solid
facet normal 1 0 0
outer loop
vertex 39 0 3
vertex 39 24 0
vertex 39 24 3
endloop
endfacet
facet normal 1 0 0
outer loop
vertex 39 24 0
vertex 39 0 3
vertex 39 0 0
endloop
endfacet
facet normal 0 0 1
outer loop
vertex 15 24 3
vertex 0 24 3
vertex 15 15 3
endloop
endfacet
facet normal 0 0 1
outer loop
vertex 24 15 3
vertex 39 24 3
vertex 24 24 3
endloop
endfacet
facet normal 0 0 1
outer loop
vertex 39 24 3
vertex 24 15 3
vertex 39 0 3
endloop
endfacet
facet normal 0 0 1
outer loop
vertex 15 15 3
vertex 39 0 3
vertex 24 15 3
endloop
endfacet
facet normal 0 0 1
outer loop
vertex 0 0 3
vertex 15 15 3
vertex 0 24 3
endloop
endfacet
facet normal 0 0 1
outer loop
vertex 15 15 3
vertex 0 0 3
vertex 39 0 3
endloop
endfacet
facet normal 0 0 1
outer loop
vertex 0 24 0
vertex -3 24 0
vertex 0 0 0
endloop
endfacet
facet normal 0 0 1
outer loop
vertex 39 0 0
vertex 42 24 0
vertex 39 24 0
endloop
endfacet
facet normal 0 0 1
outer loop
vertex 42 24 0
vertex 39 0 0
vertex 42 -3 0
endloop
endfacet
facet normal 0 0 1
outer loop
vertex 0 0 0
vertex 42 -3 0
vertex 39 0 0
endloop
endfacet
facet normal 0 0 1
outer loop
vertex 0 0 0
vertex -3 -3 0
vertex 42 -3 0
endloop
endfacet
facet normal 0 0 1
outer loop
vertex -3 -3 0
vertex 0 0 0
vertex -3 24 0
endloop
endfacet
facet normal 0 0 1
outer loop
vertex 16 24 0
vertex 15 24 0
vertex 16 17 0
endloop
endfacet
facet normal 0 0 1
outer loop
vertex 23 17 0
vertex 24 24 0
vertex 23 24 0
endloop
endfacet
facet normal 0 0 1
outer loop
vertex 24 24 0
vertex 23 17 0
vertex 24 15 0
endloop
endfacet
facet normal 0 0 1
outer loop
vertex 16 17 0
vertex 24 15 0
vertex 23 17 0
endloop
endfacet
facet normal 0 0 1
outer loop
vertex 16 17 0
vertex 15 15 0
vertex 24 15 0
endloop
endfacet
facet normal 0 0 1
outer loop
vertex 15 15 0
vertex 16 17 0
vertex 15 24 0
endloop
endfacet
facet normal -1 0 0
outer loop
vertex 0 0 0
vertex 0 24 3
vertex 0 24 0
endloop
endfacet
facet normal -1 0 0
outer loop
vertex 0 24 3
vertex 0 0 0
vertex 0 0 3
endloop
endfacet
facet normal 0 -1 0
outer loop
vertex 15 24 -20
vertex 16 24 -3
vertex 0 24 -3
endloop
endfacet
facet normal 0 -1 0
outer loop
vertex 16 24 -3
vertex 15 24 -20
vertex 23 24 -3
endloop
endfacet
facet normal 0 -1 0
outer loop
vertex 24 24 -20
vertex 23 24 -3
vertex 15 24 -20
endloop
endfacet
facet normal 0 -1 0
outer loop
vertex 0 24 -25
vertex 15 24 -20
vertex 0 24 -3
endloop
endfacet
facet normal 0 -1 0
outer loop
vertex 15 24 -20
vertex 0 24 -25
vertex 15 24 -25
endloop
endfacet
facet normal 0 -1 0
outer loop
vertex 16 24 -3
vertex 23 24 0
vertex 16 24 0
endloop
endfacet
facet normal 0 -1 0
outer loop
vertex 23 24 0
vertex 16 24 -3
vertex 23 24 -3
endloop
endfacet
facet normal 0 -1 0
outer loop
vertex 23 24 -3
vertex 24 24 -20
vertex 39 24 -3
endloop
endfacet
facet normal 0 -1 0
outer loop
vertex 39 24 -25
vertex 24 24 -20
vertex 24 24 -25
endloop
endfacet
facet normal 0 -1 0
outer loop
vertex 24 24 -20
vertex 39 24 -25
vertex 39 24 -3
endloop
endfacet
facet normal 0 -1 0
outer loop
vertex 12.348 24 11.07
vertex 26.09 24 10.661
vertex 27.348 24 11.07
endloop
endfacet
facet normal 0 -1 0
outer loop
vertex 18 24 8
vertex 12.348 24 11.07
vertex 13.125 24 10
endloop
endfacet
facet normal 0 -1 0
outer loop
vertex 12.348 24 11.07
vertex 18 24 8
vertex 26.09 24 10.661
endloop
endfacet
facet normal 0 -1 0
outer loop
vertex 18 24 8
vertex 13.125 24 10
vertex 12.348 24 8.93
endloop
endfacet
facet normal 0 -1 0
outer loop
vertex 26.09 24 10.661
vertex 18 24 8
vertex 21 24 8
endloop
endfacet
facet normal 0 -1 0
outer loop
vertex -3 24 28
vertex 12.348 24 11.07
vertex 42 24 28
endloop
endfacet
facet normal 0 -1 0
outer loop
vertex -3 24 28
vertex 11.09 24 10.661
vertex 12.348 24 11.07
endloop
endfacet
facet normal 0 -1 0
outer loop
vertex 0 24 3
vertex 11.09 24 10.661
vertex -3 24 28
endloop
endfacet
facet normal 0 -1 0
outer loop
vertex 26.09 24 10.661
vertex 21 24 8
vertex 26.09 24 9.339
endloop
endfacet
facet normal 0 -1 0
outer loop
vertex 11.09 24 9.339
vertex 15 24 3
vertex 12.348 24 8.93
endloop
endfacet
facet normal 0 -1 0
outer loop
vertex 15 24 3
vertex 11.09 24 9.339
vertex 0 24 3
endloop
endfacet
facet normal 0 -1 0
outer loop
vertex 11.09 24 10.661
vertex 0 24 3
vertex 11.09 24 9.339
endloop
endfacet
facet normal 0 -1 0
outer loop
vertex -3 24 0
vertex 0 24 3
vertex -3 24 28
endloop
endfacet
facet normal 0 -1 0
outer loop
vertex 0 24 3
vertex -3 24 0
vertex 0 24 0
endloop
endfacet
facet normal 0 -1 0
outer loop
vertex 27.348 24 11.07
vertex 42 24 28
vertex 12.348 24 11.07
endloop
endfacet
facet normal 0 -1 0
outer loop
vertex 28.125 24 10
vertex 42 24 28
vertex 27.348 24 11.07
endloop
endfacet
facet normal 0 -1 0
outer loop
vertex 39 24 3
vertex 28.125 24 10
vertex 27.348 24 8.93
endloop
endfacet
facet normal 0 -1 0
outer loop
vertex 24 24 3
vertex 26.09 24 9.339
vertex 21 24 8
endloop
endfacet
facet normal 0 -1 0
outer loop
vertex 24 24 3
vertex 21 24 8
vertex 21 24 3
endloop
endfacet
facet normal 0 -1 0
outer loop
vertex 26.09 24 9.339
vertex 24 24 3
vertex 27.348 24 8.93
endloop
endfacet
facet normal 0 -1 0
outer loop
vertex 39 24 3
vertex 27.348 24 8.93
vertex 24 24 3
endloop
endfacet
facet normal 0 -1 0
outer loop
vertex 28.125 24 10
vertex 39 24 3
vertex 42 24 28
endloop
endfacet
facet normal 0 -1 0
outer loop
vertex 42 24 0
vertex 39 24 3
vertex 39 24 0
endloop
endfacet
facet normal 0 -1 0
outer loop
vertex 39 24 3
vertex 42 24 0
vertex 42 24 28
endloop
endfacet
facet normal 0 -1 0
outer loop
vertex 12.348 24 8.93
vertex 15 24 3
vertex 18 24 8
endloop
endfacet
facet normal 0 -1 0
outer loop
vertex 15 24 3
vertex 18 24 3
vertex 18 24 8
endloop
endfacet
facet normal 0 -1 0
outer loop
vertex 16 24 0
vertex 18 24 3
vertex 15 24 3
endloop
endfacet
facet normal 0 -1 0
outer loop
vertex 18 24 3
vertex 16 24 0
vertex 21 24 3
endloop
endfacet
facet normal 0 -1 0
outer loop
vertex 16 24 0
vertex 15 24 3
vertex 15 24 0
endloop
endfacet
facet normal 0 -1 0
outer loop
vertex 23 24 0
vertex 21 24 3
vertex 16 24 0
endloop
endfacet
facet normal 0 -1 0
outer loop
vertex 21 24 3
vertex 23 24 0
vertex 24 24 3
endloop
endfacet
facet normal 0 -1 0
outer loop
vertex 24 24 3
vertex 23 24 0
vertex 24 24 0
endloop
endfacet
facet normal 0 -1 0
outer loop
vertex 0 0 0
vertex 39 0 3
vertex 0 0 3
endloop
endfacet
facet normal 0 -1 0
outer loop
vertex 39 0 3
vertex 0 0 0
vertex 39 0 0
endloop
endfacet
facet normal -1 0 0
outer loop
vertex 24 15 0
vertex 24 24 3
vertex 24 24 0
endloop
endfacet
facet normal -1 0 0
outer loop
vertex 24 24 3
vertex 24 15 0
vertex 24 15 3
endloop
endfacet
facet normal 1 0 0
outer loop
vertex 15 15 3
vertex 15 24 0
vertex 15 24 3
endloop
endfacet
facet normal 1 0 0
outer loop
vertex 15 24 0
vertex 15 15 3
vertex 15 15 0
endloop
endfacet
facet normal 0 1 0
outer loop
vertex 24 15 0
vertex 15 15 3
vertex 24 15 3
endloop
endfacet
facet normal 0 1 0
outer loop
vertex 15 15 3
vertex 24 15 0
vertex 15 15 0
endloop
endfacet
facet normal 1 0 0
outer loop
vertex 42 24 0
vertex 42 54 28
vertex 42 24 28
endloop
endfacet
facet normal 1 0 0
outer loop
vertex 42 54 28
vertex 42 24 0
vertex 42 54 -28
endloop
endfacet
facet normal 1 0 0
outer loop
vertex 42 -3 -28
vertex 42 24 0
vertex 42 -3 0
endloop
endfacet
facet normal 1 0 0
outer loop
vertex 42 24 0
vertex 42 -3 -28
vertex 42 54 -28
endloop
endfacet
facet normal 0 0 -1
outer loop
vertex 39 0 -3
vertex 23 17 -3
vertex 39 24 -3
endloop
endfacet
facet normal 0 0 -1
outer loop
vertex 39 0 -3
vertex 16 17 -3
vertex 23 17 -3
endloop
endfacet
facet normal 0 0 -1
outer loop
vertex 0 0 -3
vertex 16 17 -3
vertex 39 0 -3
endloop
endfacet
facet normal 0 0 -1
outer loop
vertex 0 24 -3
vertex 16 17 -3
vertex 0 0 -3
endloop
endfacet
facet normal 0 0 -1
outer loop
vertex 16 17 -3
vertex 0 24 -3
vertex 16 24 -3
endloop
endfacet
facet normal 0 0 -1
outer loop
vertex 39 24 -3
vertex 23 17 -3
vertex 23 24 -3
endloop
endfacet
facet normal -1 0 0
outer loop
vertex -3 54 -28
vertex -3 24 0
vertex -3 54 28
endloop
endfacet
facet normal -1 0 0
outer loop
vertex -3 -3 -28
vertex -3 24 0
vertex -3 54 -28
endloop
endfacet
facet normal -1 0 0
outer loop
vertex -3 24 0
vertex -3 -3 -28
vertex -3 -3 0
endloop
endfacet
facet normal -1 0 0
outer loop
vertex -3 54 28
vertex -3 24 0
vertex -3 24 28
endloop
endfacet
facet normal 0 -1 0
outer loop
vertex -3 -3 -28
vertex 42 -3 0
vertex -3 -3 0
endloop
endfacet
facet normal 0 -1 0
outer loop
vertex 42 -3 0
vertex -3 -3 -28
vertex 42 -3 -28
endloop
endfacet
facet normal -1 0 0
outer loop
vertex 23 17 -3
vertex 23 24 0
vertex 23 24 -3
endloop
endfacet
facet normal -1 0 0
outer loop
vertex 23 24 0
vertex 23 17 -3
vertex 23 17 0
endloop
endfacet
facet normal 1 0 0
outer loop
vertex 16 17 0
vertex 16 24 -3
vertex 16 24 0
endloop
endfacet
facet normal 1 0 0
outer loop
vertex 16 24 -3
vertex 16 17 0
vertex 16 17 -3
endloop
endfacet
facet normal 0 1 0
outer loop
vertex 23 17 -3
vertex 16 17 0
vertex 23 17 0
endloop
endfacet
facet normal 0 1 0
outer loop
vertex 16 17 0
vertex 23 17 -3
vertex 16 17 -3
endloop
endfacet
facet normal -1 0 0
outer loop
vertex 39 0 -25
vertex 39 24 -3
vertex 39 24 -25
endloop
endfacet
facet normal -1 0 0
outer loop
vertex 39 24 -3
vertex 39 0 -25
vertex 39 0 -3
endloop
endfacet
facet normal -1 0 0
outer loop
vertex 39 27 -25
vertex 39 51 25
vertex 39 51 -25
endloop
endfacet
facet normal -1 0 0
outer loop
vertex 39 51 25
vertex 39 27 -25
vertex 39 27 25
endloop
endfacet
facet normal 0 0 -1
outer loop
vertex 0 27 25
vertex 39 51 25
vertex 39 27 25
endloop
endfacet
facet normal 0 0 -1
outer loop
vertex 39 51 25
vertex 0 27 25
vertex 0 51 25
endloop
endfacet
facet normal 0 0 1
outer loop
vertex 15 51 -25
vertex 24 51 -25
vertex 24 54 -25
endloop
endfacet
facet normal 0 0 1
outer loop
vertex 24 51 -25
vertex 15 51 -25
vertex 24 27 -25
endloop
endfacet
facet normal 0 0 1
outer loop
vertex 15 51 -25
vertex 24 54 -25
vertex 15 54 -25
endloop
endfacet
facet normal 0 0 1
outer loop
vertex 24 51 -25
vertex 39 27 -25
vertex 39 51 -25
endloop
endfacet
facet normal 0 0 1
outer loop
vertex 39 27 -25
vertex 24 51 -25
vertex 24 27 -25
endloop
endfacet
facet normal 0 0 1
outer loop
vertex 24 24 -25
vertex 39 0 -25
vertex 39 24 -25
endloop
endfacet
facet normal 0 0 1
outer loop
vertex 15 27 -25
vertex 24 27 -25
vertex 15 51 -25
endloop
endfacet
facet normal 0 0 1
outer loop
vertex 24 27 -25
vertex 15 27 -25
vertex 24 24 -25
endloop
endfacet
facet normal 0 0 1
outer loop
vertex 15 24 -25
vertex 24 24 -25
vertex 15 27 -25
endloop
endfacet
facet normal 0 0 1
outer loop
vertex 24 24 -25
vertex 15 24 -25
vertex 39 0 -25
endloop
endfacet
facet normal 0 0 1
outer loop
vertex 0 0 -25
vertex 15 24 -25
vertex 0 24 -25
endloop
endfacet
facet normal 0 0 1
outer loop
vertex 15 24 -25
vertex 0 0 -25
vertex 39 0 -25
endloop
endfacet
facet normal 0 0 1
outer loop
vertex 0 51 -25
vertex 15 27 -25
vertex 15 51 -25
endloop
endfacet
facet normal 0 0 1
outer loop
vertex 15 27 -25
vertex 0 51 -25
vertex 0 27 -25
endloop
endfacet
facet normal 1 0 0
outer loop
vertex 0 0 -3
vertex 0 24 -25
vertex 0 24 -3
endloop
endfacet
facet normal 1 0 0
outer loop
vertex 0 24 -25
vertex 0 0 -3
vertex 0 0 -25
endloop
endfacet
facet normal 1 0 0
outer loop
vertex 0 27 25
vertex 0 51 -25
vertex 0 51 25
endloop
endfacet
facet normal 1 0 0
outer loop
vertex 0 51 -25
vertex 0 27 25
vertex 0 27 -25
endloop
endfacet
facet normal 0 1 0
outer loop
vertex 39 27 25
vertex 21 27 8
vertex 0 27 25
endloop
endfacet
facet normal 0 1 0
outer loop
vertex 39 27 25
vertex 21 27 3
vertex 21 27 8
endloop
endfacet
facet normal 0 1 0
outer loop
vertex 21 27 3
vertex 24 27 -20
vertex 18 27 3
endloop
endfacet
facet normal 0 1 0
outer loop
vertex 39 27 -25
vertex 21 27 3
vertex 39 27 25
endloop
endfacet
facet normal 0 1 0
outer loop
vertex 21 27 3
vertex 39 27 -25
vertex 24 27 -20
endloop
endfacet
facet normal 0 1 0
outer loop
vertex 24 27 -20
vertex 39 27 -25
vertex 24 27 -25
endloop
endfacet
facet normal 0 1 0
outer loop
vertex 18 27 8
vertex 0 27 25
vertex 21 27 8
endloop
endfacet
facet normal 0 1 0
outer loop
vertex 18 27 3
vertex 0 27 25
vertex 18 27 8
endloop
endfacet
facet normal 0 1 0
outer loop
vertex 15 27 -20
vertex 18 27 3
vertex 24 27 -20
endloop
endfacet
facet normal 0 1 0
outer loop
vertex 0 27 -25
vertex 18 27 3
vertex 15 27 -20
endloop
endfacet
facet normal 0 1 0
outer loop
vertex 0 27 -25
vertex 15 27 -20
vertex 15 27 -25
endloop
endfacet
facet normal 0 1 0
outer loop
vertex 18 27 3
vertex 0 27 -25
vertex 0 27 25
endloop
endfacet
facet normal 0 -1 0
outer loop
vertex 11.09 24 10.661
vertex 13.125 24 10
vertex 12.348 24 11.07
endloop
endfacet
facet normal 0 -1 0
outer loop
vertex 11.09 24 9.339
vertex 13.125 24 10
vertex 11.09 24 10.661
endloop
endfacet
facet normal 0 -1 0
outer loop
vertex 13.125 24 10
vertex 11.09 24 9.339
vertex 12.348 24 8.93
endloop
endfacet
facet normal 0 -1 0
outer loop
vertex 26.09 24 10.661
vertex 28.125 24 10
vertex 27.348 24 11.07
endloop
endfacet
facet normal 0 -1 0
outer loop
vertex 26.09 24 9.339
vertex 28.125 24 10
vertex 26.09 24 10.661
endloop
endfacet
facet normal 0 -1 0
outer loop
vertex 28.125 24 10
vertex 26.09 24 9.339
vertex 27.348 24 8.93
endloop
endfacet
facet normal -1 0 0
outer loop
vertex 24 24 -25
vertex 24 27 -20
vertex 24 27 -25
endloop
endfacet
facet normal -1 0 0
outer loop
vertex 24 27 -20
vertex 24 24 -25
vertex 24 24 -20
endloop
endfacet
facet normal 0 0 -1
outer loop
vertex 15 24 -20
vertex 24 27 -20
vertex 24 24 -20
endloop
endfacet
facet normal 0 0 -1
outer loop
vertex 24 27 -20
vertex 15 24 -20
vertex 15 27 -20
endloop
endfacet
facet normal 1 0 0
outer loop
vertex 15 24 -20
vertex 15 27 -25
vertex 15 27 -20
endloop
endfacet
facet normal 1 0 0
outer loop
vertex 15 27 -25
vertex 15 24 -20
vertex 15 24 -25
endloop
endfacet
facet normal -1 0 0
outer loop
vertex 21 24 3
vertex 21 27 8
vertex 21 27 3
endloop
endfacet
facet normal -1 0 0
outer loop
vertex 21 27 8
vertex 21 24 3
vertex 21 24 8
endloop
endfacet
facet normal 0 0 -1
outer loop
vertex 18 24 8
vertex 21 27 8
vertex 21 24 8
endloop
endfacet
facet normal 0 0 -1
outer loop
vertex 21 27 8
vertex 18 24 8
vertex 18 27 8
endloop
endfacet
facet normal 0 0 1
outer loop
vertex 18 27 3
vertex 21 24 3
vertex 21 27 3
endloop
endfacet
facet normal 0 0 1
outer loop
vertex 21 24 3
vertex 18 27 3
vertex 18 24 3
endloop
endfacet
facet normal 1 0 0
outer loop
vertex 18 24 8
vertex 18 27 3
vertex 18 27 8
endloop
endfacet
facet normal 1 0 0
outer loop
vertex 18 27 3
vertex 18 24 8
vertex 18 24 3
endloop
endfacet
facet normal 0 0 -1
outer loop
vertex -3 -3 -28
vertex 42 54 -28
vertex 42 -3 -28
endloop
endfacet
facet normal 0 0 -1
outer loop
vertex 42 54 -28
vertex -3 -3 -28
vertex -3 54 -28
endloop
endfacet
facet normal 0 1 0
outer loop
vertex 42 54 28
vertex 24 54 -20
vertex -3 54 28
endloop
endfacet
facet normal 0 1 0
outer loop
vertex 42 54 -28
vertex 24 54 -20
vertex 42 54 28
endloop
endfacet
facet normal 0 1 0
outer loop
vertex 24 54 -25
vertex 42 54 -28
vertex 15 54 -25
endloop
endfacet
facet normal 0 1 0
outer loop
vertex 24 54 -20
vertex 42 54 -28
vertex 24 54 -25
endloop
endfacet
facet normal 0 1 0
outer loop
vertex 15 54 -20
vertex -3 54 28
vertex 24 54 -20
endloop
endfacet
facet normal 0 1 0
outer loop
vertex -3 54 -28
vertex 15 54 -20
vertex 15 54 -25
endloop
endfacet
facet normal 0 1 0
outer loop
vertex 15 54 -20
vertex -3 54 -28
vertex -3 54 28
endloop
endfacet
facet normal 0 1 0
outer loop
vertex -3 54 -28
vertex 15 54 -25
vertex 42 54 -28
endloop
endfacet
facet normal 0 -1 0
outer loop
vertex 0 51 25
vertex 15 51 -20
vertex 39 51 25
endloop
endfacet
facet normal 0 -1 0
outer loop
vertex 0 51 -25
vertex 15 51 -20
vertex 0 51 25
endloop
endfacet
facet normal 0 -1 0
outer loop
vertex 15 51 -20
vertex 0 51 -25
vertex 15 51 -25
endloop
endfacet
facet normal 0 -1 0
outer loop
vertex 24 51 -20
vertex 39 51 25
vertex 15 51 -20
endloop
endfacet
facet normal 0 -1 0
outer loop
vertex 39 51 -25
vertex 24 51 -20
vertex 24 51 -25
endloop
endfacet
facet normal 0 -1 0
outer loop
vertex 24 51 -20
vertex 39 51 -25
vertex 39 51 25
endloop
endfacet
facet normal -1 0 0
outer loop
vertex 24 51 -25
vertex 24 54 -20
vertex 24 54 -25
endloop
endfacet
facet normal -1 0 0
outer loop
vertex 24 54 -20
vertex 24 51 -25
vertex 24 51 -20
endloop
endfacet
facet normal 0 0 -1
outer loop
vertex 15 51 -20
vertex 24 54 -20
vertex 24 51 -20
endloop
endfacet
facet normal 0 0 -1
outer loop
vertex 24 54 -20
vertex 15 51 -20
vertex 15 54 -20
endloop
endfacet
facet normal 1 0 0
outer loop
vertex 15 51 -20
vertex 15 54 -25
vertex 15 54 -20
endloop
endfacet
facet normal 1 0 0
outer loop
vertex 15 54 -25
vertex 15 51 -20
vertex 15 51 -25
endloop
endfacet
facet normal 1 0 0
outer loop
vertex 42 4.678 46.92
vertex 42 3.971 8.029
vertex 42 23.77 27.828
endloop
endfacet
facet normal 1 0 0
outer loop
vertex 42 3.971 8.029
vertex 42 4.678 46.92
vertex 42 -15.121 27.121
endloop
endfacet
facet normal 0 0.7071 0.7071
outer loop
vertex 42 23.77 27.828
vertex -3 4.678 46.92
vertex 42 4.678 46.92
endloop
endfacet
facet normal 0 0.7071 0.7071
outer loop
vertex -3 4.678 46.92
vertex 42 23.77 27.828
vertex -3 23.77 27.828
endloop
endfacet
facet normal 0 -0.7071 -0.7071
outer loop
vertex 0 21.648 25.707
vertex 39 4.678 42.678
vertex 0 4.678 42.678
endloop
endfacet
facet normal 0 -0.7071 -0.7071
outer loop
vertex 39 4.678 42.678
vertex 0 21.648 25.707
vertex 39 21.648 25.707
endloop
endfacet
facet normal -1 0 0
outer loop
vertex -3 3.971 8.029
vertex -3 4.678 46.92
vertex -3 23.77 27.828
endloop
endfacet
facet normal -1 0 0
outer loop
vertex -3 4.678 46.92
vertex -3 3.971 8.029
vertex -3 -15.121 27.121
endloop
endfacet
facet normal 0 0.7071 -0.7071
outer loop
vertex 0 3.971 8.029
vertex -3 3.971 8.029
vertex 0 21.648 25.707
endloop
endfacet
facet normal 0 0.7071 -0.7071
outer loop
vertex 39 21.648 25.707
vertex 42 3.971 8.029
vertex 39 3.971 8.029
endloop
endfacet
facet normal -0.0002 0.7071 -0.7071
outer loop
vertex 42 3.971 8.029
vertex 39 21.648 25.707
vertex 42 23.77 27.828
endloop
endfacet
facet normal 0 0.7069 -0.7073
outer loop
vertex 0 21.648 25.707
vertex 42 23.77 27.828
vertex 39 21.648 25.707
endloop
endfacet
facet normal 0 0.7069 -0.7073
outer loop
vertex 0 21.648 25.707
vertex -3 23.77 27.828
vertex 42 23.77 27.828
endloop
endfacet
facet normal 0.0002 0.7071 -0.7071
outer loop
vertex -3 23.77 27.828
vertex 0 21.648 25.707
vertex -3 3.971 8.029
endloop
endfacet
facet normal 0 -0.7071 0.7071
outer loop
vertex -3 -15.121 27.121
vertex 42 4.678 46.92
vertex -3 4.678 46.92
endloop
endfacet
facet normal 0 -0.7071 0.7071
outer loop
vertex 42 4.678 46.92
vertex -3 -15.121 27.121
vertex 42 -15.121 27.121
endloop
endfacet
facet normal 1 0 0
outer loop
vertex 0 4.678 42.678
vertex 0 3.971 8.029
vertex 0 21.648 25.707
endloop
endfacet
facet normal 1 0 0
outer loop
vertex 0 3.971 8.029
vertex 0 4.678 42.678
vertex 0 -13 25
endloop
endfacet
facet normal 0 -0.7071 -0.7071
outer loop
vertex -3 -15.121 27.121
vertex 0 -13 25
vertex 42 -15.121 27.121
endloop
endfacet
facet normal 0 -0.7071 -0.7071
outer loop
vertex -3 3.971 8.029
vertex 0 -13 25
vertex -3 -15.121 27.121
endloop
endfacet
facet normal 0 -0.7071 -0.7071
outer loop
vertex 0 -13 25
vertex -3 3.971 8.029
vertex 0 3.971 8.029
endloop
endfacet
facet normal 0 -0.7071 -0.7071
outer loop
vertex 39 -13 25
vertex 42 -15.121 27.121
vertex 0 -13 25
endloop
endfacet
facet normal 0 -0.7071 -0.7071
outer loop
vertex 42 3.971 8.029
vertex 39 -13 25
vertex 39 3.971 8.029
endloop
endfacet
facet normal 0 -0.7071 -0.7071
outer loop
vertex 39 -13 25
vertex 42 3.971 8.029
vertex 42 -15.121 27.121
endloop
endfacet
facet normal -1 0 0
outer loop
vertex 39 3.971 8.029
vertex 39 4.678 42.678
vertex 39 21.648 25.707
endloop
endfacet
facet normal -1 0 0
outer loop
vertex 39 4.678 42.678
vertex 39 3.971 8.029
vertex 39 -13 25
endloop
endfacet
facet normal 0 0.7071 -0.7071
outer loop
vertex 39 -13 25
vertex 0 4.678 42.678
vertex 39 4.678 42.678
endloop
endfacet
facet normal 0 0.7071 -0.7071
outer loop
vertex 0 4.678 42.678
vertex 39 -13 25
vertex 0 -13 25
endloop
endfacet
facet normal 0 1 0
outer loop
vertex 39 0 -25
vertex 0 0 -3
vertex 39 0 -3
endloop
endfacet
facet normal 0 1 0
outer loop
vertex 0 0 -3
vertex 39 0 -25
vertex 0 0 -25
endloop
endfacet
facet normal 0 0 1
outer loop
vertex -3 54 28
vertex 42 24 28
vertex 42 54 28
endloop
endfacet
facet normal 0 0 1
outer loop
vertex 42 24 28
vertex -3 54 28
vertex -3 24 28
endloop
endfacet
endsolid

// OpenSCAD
mthick = 3;

difference() {
color([0,0,1,0.5]) cube([39, 24, 3]);
translate([15,24-9,0]) cube([9,9,3]);
};

translate([-3,-3,-3]) difference() {
color([0,0,1,0.5]) cube([39+2*3, 24+3, 3]);
translate([19,27-7,0]) cube([7,7,3]);
};

// middle

translate([0,24,-25]) difference() {
color([0,0,1,0.5]) cube([39,3,50]);
translate([15,0,0]) cube([9,3,5]);
    // not to scale
rotate([90,0,0]) translate([12,35,0]) cylinder(3, 2.25/2, 2.25/2, 0);
    // not to scale
rotate([90,0,0]) translate([27,35,0]) cylinder(3, 2.25/2, 2.25/2, 0);
    // not to scale
    translate([18,0,28]) cube([3,3,5]);
}

// side 1

translate([-3,-3,-28]) union() {
color([0,0,1,0.5]) cube([3,24+3,25]);
translate([0,24+3,0]) color([0,0,1,0.5]) cube([3,30,53]);
};

// side 2

translate([39,-3,-28]) union() {
color([0,0,1,0.5]) cube([3,24+3,25]);
translate([0,24+3,0]) color([0,0,1,0.5]) cube([3,30,53]);
};

// bottom
translate([0,-3,-28]) color([0,0,1,0.5]) cube([39,57,3]);

// front panel
translate([0,-3,-25]) color([0,0,1,0.5]) cube([39,3,22]);

// top panel
translate([-3,24,25]) color([0,0,1,0.5]) cube([45,30,3]);

// back panel

translate([0,51,-25])
difference() {
     color([0,0,1,0.5]) cube([39,3,50]);
     translate([15,0,0]) cube([9,3,5]);
}

// lid
translate([0,-13,25]) rotate([-45,0,0]) {
// top
color([0,0,1,0.5]) translate([-3,-3,25]) cube([45,27,3]);

// sides
color([0,0,1,0.5]) translate([-3,-3,0]) cube([3,27,25]);
color([0,0,1,0.5]) translate([39,-3,0]) cube([3,27,25]);

// front
color([0,0,1,0.5]) translate([0,-3,0]) cube([39,3,25]);
};
